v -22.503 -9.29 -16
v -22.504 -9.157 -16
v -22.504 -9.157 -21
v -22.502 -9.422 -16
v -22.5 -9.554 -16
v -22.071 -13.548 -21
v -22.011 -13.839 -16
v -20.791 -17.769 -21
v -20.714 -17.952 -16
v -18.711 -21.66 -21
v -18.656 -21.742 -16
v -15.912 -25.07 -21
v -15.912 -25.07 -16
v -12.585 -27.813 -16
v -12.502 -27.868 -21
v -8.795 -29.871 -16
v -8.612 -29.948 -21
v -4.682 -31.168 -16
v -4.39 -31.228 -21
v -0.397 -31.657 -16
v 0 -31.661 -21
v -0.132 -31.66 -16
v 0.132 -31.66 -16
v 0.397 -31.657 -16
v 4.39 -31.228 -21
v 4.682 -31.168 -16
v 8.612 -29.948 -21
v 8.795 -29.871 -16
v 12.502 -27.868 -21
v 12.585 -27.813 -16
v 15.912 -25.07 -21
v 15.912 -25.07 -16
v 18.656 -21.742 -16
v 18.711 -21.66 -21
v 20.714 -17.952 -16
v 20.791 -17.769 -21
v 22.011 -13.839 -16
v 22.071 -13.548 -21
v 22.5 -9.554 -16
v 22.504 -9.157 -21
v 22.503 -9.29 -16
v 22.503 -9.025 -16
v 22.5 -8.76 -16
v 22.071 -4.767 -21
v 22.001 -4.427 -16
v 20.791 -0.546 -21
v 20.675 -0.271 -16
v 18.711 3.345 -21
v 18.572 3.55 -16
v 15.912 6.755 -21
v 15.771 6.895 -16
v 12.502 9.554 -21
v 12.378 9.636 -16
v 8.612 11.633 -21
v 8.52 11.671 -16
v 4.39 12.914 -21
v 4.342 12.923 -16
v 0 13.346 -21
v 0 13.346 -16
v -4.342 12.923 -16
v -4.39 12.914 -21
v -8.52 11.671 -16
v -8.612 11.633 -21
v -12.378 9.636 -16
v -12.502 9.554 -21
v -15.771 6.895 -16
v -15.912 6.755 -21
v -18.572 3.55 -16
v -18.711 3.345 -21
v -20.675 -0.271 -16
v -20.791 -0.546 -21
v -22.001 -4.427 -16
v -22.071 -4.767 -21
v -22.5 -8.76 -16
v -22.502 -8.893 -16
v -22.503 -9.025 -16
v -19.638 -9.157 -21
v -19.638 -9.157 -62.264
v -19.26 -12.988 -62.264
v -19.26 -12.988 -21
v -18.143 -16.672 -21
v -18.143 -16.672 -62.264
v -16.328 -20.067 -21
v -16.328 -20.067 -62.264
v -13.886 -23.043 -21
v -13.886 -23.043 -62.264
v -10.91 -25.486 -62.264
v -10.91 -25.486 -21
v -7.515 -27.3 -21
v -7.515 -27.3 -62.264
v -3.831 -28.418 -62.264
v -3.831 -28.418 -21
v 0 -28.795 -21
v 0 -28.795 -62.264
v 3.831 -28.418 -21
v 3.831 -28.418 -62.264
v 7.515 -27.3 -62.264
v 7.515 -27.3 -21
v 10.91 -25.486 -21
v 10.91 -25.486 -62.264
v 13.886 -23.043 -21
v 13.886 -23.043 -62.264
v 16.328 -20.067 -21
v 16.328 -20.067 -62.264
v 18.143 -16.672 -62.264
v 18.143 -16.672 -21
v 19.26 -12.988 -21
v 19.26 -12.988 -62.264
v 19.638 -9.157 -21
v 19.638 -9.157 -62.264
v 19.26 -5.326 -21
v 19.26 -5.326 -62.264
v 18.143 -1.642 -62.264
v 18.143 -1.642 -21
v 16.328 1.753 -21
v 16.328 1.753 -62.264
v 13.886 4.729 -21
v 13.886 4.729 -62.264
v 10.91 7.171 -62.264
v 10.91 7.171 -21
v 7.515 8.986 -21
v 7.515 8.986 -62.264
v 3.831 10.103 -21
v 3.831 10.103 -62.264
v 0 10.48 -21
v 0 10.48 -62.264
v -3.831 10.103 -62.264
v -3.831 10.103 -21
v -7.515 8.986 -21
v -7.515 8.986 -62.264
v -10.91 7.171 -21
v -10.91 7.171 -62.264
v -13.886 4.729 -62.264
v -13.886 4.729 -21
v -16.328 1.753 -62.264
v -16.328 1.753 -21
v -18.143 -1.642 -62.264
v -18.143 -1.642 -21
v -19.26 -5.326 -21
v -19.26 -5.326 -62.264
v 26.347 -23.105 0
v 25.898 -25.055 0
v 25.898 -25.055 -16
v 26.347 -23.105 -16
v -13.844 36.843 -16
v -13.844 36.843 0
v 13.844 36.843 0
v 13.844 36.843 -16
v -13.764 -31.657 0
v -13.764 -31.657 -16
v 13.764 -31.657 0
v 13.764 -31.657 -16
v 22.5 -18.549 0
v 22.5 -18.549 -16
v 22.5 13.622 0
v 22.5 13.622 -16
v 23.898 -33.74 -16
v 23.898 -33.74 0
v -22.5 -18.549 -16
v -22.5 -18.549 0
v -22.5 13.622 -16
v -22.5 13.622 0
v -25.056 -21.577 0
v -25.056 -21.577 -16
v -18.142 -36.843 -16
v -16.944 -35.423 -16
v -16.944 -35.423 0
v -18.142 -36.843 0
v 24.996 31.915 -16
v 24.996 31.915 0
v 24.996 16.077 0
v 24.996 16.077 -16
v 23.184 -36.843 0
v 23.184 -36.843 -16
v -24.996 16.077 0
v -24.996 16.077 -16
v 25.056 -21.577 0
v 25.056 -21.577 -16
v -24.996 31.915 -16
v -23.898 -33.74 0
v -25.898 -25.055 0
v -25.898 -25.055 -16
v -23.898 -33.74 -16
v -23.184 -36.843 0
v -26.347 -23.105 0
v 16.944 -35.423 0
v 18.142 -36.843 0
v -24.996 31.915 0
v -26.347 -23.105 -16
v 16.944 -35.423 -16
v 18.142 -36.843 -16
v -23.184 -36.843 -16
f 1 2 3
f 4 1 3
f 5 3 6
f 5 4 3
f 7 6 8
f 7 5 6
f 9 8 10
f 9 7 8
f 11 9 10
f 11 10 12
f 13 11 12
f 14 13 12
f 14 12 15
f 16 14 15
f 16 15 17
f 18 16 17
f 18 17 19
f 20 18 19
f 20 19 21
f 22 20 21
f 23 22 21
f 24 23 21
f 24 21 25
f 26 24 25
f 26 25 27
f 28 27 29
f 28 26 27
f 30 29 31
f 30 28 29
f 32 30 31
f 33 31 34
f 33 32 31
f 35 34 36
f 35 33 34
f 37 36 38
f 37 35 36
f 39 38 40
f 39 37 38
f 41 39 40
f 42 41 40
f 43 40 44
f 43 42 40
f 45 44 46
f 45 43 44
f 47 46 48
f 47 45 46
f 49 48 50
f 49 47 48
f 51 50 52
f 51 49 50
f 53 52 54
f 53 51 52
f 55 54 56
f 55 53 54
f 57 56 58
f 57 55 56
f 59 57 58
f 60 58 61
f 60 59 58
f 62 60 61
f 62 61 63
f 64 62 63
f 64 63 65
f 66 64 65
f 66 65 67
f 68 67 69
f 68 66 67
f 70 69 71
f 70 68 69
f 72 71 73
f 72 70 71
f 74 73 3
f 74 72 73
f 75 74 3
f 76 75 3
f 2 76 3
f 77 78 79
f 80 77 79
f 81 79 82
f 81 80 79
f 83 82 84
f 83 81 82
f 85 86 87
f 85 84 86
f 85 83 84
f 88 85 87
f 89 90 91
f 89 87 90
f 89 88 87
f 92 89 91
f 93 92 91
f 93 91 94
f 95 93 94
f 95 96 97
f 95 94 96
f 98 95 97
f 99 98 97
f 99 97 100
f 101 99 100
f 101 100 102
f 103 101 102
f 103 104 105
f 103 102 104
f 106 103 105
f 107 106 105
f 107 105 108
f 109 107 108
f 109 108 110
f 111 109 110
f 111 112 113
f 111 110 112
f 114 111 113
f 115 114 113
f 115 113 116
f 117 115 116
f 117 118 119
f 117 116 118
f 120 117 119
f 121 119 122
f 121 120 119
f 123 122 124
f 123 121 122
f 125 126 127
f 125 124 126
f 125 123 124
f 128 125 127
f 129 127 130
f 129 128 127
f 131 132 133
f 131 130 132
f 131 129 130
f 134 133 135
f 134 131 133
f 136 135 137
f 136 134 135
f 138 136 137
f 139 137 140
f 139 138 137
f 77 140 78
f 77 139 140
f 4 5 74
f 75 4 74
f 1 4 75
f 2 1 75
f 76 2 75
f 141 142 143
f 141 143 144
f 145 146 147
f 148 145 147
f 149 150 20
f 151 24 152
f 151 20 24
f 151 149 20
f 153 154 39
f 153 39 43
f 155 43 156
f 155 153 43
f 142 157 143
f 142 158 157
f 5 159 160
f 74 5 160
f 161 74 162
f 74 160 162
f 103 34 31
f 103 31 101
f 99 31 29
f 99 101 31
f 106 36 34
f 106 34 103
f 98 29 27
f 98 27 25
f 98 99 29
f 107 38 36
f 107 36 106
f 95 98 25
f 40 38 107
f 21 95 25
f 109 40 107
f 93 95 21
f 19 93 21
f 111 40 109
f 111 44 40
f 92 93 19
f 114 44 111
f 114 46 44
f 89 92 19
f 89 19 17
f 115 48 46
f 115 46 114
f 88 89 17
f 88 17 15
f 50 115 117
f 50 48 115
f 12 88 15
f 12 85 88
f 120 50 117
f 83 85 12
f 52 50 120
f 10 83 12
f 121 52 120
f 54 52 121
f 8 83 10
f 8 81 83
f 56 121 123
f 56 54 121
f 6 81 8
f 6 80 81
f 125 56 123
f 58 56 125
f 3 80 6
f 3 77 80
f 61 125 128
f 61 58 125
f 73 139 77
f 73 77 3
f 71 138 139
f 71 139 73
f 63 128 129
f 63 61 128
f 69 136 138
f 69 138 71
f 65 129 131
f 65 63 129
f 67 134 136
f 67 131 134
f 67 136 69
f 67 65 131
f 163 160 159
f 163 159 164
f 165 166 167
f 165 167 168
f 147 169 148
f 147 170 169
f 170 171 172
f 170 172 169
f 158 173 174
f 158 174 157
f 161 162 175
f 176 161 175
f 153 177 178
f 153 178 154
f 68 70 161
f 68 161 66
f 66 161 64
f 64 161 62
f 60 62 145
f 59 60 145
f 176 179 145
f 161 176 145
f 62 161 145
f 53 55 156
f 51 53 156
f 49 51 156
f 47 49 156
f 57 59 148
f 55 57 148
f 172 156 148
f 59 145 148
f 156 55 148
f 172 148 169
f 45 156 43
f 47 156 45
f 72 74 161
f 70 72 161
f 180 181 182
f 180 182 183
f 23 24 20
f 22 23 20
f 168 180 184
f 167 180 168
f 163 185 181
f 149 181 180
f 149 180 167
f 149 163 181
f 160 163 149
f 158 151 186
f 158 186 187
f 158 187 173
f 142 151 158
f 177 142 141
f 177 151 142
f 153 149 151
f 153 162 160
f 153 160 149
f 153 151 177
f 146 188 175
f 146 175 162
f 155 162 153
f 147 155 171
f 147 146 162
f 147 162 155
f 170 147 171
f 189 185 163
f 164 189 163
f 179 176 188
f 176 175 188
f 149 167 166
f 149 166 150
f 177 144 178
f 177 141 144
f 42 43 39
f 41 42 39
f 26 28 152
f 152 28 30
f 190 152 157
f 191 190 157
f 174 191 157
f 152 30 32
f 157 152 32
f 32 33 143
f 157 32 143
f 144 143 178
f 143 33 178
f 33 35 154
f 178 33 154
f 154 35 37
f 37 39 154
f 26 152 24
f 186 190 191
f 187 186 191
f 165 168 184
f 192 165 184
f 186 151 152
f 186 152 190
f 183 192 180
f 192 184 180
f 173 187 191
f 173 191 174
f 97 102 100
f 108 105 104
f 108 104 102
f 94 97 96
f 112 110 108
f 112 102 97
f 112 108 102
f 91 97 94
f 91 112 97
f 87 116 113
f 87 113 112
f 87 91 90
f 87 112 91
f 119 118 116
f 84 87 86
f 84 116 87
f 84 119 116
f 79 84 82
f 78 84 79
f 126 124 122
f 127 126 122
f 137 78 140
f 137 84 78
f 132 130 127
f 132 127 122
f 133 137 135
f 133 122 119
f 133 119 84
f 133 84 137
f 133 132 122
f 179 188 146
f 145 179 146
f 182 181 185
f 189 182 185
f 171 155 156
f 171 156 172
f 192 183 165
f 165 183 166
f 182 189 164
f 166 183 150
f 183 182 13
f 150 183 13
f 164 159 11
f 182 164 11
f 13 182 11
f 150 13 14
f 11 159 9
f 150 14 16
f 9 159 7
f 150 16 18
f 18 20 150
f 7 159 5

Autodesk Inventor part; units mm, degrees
ref_plane "YZ Plane" through (0, 0, 0) normal (1, 0, 0) x (0, 1, 0)
ref_plane "Plan de construction1" through (0, 0, 0) normal (0, 0, 1) x (1, 0, 0)
sketch "Esquisse1" plane through (0, 0, 0) normal (0, 0, 1) x (1, 0, 0)
  circle A0 centre (18, -9.1573) radius 3.05 projected
  arc A1 (16.3537, 35.0227) -> (19.3537, 33.6971) centre (18.8691, 36.6577) ccw projected
  arc A2 (16.3537, 35.0227) -> (9.6181, 34.9787) centre (13, 32.8427) ccw projected
  arc A3 (6.0453, 33.7654) -> (9.6181, 34.9787) centre (7.0816, 36.5807) ccw projected
  arc A4 (6.0453, 33.7654) -> (-6.0453, 33.7654) centre (0, 17.3427) ccw projected
  arc A5 (-9.6181, 34.9787) -> (-6.0453, 33.7654) centre (-7.0816, 36.5807) ccw projected
  arc A6 (-9.6181, 34.9787) -> (-16.3537, 35.0227) centre (-13, 32.8427) ccw projected
  arc A7 (-19.3537, 33.6971) -> (-16.3537, 35.0227) centre (-18.8691, 36.6577) ccw projected
  arc A8 (-19.3537, 33.6971) -> (-23.0131, 27.1188) centre (-20, 29.7497) ccw projected
  line L0 (-23.0131, 27.1188) -> (-21.6977, 25.6123) projected
  arc A9 (-21.984, 21.3792) -> (-21.6977, 25.6123) centre (-23.9573, 23.6389) ccw projected
  line L1 (-21.984, 21.3792) -> (-23.6265, 19.9451) projected
  arc A10 (-23.6265, 19.9451) -> (-23.5067, 13.8184) centre (-20.9956, 16.932) ccw projected
  arc A11 (-20.4202, 0.2907) -> (-23.5067, 13.8184) centre (-30.5395, 5.0978) ccw projected
  arc A12 (-20.4202, 0.2907) -> (-21.1202, -16.9153) centre (0, -9.1573) ccw projected
  line L2 (-21.1202, -16.9153) -> (-25.0562, -21.5766) projected
  arc A13 (-25.0562, -21.5766) -> (-25.898, -25.0549) centre (-22, -24.1573) ccw projected
  line L3 (-25.898, -25.0549) -> (-23.898, -33.7403) projected
  arc A14 (-23.898, -33.7403) -> (-16.9438, -35.4234) centre (-20, -32.8427) ccw projected
  line L4 (-16.9438, -35.4234) -> (-12.7634, -30.4726) projected
  arc A15 (-9.2394, -29.6727) -> (-12.7634, -30.4726) centre (-10.4713, -32.4081) ccw projected
  arc A16 (-9.2394, -29.6727) -> (9.2394, -29.6727) centre (0, -9.1573) ccw projected
  arc A17 (12.7634, -30.4726) -> (9.2394, -29.6727) centre (10.4713, -32.4081) ccw projected
  line L5 (12.7634, -30.4726) -> (16.9438, -35.4234) projected
  arc A18 (16.9438, -35.4234) -> (23.898, -33.7403) centre (20, -32.8427) ccw projected
  line L6 (23.898, -33.7403) -> (25.898, -25.0549) projected
  arc A19 (25.898, -25.0549) -> (25.0562, -21.5766) centre (22, -24.1573) ccw projected
  line L7 (25.0562, -21.5766) -> (21.1202, -16.9153) projected
  arc A20 (21.1202, -16.9153) -> (20.477, 0.167) centre (0, -9.1573) ccw projected
  arc A21 (23.6268, 14.7402) -> (20.477, 0.167) centre (31.8353, 5.339) ccw projected
  arc A22 (23.6268, 14.7402) -> (23.507, 20.8669) centre (20.996, 17.7533) ccw projected
  line L8 (23.507, 20.8669) -> (22.4423, 21.7255) projected
  arc A23 (22.0658, 26.0339) -> (22.4423, 21.7255) centre (24.3256, 24.0608) ccw projected
  line L9 (22.0658, 26.0339) -> (23.0131, 27.1188) projected
  arc A24 (23.0131, 27.1188) -> (19.3537, 33.6971) centre (20, 29.7497) ccw projected
  circle A25 centre (13, 32.8427) radius 2 projected
  circle A26 centre (-13, 32.8427) radius 2 projected
  circle A27 centre (-22, -24.1573) radius 2 projected
  circle A28 centre (22, -24.1573) radius 2 projected
  circle A29 centre (-18, -9.1573) radius 3.05 projected
  line L10 (0, -31.6573) -> (13.7637, -31.6573)
  line L11 (13.7637, -31.6573) -> (18.1423, -36.8427)
  line L12 (18.1423, -36.8427) -> (23.1836, -36.8427)
  line L13 (23.1836, -36.8427) -> (26.3469, -23.1052)
  line L14 (26.3469, -23.1052) -> (22.5, -18.5494)
  line L15 (22.5, -18.5494) -> (22.5, 13.6223)
  line L16 (22.5, 13.6223) -> (24.996, 16.0767)
  line L17 (24.996, 16.0767) -> (24.996, 31.9152)
  line L18 (24.996, 31.9152) -> (13.8443, 36.8427)
  line L19 (13.8443, 36.8427) -> (0, 36.8427)
  line L20 (0, 0) -> (0, -45.3526)
  line L21 (0, -31.6573) -> (-13.7637, -31.6573)
  line L22 (-13.7637, -31.6573) -> (-18.1423, -36.8427)
  line L23 (-18.1423, -36.8427) -> (-23.1836, -36.8427)
  line L24 (-23.1836, -36.8427) -> (-26.3469, -23.1052)
  line L25 (-26.3469, -23.1052) -> (-22.5, -18.5494)
  line L26 (-22.5, -18.5494) -> (-22.5, 13.6223)
  line L27 (-22.5, 13.6223) -> (-24.996, 16.0767)
  line L28 (-24.996, 16.0767) -> (-24.996, 31.9152)
  line L29 (-24.996, 31.9152) -> (-13.8443, 36.8427)
  line L30 (-13.8443, 36.8427) -> (0, 36.8427)
  point P0 (23.898, -33.7403)
ref_plane "Plan de construction2" through (-24.996, -18.6052, -16) normal (0, 0, -1) x (0, 1, 0)
extrude "Extrusion1" add sketch "Esquisse1" against normal up to surface (16 mm away) contours A0 | A2 L18 A24 A1 | A1 A24 L9 A23 L8 A22 A21 A20 L7 A19 L6 A18 L5 A17 A16 A15 L4 A14 L3 A13 L2 A12 A11 L26 L27 A10 L1 A9 L0 A8 A7 A6 A5 A4 A3 A2 | A2 L19 L18 | L18 L17 A22 L8 A23 L9 A24 | A2 A3 A4 A5 A6 L30 L19 | L17 L16 A22 | A6 L29 L30 | L16 A21 A22 | A6 A7 A8 L29 | L15 A20 A21 | A8 L0 A9 L1 A10 L28 L29 | L15 L7 A20 | A10 L27 L28 | L14 L13 A19 | L13 L12 A18 | A11 A12 L26 | L12 L11 A18 | A12 L2 L26 | L10 A16 A17 L5 | A13 L24 L25 | L21 L4 A15 A16 | A14 L23 L24 | L22 L23 A14 | A25 | A26 | A27 | A28 | A29
sketch "Esquisse2" plane through (0, -9.1573, -16) normal (0, 0, -1) x (-1, 0, 0)
  circle A0 centre (0, 0) radius 22.5035
  point P0 (0, 9.1573)
ref_plane "Plan de construction3" through (-23.77, -32.9273, -21) normal (0, 0, -1) x (0, 1, 0)
extrude "Extrusion2" add sketch "Esquisse2" along normal up to surface (5 mm away)
sketch "Esquisse3" plane through (0, -9.1573, -21) normal (0, 0, -1) x (-1, 0, 0)
  circle A0 centre (0, 0) radius 19.6378
  point P0 (0, 9.1573)
extrude "Extrusion3" add sketch "Esquisse3" along normal up to surface (41.2635 mm away)
properties part number "simple_lidar_shape"
